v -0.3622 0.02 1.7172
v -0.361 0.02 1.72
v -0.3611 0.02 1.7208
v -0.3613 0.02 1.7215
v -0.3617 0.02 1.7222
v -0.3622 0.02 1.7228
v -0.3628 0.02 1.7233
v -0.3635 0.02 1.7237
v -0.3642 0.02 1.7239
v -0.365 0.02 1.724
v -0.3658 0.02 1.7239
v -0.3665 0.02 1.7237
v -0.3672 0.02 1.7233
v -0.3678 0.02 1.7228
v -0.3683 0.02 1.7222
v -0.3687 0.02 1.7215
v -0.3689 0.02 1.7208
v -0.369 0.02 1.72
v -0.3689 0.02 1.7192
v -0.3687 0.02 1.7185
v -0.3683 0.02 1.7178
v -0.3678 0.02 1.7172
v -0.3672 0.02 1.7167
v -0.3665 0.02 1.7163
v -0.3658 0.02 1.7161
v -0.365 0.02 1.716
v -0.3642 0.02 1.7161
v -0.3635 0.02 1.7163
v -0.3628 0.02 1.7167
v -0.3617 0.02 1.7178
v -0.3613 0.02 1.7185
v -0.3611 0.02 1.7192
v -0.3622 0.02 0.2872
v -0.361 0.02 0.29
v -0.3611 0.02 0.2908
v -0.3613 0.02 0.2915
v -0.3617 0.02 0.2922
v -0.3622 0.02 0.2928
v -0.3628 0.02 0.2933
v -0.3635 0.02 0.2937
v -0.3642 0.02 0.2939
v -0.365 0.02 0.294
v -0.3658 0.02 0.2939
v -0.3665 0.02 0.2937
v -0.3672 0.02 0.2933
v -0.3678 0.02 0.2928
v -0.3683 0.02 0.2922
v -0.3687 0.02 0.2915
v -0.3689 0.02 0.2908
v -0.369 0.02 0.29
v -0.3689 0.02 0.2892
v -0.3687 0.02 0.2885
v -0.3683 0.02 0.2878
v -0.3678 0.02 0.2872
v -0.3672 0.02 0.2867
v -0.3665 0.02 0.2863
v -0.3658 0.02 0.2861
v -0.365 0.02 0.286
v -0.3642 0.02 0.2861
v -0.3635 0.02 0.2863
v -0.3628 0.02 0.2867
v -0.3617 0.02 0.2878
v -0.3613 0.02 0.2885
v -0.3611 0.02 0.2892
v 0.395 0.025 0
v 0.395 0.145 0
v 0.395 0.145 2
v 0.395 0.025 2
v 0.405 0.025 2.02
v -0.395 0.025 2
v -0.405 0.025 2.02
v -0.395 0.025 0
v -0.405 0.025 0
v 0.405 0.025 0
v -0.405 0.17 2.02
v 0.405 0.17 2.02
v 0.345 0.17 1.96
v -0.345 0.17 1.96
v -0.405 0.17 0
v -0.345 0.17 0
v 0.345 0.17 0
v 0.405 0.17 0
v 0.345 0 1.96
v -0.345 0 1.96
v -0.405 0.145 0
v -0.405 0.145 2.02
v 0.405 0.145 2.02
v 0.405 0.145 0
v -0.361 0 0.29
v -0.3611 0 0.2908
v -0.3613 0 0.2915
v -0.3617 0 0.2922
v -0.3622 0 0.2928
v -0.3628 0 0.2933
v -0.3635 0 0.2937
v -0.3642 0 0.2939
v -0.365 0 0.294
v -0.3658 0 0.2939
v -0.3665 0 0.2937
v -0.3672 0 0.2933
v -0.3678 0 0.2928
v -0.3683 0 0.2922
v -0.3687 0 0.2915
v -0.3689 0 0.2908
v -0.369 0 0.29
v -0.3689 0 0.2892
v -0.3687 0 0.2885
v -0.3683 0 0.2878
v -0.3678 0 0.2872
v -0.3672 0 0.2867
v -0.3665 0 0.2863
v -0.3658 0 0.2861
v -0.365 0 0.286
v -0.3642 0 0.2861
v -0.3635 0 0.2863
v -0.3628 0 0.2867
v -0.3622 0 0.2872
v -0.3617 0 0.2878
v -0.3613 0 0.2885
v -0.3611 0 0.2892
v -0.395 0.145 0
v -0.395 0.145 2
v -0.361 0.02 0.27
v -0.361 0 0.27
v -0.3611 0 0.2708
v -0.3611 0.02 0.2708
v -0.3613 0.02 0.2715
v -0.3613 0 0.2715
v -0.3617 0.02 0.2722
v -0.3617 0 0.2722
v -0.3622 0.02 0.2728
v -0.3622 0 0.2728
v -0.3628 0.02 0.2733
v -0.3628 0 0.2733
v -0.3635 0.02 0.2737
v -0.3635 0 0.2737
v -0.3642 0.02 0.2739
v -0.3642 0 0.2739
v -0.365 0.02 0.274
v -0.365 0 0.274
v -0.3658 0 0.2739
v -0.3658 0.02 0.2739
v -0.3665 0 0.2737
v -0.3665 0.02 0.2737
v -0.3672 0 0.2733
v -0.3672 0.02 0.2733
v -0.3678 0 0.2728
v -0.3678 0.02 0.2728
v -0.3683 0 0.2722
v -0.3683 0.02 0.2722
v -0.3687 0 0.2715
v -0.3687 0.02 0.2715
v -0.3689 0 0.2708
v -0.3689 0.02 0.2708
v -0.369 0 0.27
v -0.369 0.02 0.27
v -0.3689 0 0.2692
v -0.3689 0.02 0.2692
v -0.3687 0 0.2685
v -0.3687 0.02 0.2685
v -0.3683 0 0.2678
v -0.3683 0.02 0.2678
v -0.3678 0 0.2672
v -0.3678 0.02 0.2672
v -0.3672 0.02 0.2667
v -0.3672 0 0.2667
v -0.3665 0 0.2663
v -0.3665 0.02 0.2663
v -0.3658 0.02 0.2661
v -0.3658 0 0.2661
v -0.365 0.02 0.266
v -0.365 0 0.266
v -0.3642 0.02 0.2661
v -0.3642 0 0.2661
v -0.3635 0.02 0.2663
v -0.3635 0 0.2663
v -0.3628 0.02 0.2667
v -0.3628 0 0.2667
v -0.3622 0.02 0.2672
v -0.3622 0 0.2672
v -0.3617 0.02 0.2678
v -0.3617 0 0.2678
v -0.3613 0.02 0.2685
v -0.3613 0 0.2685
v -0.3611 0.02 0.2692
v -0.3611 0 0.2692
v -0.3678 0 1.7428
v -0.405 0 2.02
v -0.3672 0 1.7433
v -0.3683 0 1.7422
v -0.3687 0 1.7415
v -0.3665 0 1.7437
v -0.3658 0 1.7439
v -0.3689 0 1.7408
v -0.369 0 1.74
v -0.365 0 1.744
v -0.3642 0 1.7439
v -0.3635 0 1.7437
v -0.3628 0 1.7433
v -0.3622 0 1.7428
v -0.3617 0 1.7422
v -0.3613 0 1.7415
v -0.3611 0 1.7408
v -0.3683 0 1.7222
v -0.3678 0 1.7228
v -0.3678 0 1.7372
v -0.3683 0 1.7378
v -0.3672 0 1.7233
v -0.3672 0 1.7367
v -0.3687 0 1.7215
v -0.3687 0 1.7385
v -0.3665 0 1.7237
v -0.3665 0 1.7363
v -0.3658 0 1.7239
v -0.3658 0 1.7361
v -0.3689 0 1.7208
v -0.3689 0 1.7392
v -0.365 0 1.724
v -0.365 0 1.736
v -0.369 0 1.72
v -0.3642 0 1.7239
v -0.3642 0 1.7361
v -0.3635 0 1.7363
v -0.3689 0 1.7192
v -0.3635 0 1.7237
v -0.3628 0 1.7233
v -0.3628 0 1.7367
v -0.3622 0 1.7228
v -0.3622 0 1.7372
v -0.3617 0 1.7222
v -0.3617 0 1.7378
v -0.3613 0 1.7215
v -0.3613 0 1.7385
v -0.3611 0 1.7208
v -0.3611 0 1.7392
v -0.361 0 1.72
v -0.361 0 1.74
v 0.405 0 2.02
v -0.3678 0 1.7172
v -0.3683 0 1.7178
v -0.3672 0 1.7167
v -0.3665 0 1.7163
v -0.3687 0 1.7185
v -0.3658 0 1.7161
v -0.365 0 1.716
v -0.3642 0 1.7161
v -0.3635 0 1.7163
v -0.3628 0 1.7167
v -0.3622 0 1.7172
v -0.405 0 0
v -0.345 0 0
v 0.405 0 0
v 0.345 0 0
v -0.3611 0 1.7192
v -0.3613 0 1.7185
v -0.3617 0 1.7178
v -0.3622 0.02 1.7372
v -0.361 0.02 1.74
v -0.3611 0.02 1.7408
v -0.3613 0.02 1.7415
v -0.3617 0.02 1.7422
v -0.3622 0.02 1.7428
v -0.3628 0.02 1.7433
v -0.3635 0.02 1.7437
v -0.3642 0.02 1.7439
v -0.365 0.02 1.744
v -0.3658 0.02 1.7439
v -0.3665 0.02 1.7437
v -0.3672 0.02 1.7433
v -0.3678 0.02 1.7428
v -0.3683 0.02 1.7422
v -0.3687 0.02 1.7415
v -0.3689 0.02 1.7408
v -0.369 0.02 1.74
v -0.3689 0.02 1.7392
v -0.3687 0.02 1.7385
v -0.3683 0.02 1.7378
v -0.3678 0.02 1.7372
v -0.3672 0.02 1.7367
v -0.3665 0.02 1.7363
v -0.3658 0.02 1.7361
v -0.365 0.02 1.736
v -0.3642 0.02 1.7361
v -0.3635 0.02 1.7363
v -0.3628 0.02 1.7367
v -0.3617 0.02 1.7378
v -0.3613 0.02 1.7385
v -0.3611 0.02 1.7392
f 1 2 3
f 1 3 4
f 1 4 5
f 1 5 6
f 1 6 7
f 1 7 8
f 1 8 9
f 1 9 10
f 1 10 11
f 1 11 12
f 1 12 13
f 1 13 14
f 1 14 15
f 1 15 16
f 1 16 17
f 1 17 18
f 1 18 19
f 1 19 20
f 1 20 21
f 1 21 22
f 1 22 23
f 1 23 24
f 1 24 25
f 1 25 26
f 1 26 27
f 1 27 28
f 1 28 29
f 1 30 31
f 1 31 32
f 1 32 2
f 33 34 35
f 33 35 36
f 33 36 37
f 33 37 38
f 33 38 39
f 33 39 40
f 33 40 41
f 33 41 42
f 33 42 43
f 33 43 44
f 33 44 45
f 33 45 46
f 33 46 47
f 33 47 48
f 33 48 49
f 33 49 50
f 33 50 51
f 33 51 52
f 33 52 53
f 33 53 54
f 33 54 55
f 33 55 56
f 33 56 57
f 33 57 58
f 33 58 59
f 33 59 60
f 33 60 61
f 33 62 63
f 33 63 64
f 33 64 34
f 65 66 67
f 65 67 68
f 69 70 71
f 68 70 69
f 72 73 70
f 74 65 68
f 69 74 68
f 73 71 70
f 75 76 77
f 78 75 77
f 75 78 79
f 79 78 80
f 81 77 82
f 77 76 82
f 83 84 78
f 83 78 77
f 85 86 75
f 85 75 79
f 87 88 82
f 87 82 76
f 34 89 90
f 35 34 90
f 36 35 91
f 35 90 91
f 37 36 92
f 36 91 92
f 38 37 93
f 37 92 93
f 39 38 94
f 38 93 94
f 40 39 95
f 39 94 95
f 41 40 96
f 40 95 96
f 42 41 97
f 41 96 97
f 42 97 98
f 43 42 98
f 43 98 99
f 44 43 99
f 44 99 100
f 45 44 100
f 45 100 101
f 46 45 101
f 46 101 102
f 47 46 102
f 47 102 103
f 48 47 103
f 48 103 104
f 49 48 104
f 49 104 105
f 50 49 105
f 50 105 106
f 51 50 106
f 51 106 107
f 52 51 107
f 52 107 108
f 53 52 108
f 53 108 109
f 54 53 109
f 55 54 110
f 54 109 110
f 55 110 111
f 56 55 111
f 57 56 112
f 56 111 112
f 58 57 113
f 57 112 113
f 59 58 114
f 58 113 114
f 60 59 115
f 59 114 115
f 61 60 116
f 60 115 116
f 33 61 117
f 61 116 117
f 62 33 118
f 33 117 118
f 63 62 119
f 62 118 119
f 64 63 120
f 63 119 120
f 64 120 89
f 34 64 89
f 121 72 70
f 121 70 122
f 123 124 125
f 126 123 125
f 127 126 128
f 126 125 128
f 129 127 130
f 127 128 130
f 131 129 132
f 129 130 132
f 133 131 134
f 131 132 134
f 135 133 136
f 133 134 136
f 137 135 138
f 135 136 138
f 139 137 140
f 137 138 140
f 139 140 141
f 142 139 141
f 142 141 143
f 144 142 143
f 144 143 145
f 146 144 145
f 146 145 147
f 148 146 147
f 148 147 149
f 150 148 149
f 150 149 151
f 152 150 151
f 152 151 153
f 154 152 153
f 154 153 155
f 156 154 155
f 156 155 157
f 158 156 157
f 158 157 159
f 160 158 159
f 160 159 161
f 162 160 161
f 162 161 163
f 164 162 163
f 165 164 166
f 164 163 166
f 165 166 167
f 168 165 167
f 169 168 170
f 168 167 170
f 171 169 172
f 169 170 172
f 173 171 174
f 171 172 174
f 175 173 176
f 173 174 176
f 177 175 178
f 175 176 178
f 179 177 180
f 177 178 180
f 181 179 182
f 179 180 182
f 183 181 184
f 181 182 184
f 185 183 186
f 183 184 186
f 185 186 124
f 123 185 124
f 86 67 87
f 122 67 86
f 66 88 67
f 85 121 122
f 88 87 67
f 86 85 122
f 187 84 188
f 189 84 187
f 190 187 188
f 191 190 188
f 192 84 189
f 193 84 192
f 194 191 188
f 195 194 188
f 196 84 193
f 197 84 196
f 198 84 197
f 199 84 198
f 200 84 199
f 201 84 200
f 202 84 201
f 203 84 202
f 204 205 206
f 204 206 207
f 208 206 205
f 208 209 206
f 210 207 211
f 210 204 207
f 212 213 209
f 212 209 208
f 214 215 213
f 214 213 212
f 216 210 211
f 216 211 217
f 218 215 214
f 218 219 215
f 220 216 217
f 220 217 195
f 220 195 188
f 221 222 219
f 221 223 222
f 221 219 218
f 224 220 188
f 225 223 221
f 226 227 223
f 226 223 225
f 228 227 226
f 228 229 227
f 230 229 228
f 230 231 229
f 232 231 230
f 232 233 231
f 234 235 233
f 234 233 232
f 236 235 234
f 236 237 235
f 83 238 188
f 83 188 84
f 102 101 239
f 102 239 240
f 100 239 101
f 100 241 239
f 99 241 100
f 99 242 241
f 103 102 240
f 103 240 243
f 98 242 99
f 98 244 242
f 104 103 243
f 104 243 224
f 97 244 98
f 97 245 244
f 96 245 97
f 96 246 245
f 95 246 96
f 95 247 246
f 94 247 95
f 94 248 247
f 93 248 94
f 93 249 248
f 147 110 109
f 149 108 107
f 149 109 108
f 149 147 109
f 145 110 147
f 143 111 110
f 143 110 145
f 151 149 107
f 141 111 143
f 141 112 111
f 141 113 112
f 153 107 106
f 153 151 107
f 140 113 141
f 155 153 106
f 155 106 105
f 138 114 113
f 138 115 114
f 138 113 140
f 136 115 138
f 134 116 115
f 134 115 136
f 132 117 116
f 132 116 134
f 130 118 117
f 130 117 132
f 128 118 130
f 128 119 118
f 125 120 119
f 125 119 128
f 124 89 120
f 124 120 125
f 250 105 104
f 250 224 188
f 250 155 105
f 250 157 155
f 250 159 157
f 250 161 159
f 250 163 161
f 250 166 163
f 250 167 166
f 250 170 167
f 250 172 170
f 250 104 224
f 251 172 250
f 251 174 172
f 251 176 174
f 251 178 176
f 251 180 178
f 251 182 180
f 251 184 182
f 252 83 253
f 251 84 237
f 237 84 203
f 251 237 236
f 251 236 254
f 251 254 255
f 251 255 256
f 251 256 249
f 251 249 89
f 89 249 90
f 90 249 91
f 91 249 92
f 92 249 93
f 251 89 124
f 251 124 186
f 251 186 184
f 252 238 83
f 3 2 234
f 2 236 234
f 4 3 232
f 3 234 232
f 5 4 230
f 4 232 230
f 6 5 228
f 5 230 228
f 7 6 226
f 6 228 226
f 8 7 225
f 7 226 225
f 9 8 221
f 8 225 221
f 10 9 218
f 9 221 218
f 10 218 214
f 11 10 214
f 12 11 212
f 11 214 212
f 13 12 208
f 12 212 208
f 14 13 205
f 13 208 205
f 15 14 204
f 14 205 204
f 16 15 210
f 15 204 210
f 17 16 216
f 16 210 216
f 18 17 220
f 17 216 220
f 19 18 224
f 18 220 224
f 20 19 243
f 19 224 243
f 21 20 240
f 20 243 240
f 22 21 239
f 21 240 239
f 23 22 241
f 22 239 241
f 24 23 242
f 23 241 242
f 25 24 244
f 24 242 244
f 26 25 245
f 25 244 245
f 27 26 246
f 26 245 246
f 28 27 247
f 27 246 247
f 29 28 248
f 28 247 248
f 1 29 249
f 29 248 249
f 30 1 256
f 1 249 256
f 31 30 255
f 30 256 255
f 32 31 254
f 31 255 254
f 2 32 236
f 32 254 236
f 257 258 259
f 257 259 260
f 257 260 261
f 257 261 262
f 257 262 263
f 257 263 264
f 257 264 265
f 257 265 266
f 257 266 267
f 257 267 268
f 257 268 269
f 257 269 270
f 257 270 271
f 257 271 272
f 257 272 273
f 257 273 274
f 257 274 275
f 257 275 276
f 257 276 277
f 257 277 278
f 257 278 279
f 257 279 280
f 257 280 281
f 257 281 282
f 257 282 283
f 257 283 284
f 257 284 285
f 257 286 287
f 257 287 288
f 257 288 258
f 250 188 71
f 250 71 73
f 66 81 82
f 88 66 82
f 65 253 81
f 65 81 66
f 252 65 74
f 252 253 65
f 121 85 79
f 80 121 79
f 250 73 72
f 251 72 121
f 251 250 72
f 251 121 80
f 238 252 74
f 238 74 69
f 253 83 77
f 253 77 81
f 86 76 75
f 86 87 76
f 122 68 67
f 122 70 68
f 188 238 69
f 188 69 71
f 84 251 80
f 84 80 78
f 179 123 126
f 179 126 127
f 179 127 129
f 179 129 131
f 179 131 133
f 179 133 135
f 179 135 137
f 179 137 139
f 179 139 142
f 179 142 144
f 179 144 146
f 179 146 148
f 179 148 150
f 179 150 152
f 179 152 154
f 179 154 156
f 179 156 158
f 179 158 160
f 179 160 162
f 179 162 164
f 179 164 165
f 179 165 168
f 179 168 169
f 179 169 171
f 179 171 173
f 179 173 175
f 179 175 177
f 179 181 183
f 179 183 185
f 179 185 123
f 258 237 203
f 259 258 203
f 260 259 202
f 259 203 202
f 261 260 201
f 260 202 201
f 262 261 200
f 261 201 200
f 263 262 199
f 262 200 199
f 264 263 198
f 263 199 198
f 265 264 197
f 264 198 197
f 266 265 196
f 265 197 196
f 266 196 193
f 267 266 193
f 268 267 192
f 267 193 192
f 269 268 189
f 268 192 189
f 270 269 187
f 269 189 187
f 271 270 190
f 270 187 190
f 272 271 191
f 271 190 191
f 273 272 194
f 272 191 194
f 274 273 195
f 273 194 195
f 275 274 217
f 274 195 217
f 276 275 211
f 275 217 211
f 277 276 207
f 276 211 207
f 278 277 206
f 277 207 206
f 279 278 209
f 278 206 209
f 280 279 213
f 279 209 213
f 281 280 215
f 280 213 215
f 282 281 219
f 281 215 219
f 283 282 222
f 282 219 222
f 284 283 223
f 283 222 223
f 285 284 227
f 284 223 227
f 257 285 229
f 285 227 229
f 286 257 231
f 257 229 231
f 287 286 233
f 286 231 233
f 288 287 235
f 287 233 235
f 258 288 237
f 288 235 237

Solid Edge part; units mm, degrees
sketch "Sketch1" plane through (0, 0, 0) normal (0, -1, 0) x (1, 0, 0)
  line L0 (-0.405, 0) -> (0.405, 0)
  line L1 (0.405, 0) -> (0.405, 2.02)
  line L2 (0.405, 2.02) -> (-0.405, 2.02)
  line L3 (-0.405, 2.02) -> (-0.405, 0)
  dimension "D1" = 2.02
  dimension "D2" = 0.81
extrude "Protrusion1" add sketch "Sketch1" against normal blind 0.17
sketch "Sketch2" plane through (0, 0.085, 0) normal (0, 0, -1) x (1, 0, 0)
  line L0 (-0.405, -0.06) -> (-0.405, 0.06)
  line L1 (-0.405, 0.06) -> (-0.395, 0.06)
  line L2 (-0.395, 0.06) -> (-0.395, -0.06)
  line L3 (-0.395, -0.06) -> (-0.405, -0.06)
  dimension "D1" = 0.12
  dimension "D2" = 0.01
extrude "Cutout1" cut sketch "Sketch2" against normal through all
mirror "Mirror1" about plane through (0, 0, 0) normal (1, 0, 0) of "Cutout1"
sketch "Sketch3" plane through (0, 0, 0) normal (1, 0, 0) x (0, 1, 0)
  line L0 (0.025, 2.02) -> (0.025, 2)
  line L1 (0.025, 2) -> (0.145, 2)
  line L2 (0.145, 2.02) -> (0.145, 2)
  line L3 (0.145, 2.02) -> (0.025, 2.02)
  dimension "D1" = 0.02
extrude "Cutout3" cut sketch "Sketch3" along normal through all and the other way through all
sketch "Sketch4" plane through (0, 0, 1.01) normal (0, -1, 0) x (1, 0, 0)
  line L0 (-0.345, -1.01) -> (0.345, -1.01)
  line L1 (0.345, 0.95) -> (0.345, -1.01)
  line L2 (-0.345, 0.95) -> (0.345, 0.95)
  line L3 (-0.345, -1.01) -> (-0.345, 0.95)
  dimension "D1" = 0.69
  dimension "D2" = 1.96
extrude "Cutout4" cut sketch "Sketch4" against normal through all
sketch "Sketch5" plane through (0, 0, 1.01) normal (0, -1, 0) x (1, 0, 0)
  circle A0 centre (-0.365, -0.72) radius 0.004
  circle A1 centre (-0.365, 0.71) radius 0.004
  circle A2 centre (-0.365, 0.73) radius 0.004
  circle A3 centre (-0.365, -0.74) radius 0.004
  dimension "D1" = 0.008
  dimension "D2" = 0.02
  dimension "D3" = 0.27
  dimension "D4" = 0.02
  dimension "D5" = 1.45
extrude "Ausschnitt_5" cut sketch "Sketch5" against normal blind 0.02
